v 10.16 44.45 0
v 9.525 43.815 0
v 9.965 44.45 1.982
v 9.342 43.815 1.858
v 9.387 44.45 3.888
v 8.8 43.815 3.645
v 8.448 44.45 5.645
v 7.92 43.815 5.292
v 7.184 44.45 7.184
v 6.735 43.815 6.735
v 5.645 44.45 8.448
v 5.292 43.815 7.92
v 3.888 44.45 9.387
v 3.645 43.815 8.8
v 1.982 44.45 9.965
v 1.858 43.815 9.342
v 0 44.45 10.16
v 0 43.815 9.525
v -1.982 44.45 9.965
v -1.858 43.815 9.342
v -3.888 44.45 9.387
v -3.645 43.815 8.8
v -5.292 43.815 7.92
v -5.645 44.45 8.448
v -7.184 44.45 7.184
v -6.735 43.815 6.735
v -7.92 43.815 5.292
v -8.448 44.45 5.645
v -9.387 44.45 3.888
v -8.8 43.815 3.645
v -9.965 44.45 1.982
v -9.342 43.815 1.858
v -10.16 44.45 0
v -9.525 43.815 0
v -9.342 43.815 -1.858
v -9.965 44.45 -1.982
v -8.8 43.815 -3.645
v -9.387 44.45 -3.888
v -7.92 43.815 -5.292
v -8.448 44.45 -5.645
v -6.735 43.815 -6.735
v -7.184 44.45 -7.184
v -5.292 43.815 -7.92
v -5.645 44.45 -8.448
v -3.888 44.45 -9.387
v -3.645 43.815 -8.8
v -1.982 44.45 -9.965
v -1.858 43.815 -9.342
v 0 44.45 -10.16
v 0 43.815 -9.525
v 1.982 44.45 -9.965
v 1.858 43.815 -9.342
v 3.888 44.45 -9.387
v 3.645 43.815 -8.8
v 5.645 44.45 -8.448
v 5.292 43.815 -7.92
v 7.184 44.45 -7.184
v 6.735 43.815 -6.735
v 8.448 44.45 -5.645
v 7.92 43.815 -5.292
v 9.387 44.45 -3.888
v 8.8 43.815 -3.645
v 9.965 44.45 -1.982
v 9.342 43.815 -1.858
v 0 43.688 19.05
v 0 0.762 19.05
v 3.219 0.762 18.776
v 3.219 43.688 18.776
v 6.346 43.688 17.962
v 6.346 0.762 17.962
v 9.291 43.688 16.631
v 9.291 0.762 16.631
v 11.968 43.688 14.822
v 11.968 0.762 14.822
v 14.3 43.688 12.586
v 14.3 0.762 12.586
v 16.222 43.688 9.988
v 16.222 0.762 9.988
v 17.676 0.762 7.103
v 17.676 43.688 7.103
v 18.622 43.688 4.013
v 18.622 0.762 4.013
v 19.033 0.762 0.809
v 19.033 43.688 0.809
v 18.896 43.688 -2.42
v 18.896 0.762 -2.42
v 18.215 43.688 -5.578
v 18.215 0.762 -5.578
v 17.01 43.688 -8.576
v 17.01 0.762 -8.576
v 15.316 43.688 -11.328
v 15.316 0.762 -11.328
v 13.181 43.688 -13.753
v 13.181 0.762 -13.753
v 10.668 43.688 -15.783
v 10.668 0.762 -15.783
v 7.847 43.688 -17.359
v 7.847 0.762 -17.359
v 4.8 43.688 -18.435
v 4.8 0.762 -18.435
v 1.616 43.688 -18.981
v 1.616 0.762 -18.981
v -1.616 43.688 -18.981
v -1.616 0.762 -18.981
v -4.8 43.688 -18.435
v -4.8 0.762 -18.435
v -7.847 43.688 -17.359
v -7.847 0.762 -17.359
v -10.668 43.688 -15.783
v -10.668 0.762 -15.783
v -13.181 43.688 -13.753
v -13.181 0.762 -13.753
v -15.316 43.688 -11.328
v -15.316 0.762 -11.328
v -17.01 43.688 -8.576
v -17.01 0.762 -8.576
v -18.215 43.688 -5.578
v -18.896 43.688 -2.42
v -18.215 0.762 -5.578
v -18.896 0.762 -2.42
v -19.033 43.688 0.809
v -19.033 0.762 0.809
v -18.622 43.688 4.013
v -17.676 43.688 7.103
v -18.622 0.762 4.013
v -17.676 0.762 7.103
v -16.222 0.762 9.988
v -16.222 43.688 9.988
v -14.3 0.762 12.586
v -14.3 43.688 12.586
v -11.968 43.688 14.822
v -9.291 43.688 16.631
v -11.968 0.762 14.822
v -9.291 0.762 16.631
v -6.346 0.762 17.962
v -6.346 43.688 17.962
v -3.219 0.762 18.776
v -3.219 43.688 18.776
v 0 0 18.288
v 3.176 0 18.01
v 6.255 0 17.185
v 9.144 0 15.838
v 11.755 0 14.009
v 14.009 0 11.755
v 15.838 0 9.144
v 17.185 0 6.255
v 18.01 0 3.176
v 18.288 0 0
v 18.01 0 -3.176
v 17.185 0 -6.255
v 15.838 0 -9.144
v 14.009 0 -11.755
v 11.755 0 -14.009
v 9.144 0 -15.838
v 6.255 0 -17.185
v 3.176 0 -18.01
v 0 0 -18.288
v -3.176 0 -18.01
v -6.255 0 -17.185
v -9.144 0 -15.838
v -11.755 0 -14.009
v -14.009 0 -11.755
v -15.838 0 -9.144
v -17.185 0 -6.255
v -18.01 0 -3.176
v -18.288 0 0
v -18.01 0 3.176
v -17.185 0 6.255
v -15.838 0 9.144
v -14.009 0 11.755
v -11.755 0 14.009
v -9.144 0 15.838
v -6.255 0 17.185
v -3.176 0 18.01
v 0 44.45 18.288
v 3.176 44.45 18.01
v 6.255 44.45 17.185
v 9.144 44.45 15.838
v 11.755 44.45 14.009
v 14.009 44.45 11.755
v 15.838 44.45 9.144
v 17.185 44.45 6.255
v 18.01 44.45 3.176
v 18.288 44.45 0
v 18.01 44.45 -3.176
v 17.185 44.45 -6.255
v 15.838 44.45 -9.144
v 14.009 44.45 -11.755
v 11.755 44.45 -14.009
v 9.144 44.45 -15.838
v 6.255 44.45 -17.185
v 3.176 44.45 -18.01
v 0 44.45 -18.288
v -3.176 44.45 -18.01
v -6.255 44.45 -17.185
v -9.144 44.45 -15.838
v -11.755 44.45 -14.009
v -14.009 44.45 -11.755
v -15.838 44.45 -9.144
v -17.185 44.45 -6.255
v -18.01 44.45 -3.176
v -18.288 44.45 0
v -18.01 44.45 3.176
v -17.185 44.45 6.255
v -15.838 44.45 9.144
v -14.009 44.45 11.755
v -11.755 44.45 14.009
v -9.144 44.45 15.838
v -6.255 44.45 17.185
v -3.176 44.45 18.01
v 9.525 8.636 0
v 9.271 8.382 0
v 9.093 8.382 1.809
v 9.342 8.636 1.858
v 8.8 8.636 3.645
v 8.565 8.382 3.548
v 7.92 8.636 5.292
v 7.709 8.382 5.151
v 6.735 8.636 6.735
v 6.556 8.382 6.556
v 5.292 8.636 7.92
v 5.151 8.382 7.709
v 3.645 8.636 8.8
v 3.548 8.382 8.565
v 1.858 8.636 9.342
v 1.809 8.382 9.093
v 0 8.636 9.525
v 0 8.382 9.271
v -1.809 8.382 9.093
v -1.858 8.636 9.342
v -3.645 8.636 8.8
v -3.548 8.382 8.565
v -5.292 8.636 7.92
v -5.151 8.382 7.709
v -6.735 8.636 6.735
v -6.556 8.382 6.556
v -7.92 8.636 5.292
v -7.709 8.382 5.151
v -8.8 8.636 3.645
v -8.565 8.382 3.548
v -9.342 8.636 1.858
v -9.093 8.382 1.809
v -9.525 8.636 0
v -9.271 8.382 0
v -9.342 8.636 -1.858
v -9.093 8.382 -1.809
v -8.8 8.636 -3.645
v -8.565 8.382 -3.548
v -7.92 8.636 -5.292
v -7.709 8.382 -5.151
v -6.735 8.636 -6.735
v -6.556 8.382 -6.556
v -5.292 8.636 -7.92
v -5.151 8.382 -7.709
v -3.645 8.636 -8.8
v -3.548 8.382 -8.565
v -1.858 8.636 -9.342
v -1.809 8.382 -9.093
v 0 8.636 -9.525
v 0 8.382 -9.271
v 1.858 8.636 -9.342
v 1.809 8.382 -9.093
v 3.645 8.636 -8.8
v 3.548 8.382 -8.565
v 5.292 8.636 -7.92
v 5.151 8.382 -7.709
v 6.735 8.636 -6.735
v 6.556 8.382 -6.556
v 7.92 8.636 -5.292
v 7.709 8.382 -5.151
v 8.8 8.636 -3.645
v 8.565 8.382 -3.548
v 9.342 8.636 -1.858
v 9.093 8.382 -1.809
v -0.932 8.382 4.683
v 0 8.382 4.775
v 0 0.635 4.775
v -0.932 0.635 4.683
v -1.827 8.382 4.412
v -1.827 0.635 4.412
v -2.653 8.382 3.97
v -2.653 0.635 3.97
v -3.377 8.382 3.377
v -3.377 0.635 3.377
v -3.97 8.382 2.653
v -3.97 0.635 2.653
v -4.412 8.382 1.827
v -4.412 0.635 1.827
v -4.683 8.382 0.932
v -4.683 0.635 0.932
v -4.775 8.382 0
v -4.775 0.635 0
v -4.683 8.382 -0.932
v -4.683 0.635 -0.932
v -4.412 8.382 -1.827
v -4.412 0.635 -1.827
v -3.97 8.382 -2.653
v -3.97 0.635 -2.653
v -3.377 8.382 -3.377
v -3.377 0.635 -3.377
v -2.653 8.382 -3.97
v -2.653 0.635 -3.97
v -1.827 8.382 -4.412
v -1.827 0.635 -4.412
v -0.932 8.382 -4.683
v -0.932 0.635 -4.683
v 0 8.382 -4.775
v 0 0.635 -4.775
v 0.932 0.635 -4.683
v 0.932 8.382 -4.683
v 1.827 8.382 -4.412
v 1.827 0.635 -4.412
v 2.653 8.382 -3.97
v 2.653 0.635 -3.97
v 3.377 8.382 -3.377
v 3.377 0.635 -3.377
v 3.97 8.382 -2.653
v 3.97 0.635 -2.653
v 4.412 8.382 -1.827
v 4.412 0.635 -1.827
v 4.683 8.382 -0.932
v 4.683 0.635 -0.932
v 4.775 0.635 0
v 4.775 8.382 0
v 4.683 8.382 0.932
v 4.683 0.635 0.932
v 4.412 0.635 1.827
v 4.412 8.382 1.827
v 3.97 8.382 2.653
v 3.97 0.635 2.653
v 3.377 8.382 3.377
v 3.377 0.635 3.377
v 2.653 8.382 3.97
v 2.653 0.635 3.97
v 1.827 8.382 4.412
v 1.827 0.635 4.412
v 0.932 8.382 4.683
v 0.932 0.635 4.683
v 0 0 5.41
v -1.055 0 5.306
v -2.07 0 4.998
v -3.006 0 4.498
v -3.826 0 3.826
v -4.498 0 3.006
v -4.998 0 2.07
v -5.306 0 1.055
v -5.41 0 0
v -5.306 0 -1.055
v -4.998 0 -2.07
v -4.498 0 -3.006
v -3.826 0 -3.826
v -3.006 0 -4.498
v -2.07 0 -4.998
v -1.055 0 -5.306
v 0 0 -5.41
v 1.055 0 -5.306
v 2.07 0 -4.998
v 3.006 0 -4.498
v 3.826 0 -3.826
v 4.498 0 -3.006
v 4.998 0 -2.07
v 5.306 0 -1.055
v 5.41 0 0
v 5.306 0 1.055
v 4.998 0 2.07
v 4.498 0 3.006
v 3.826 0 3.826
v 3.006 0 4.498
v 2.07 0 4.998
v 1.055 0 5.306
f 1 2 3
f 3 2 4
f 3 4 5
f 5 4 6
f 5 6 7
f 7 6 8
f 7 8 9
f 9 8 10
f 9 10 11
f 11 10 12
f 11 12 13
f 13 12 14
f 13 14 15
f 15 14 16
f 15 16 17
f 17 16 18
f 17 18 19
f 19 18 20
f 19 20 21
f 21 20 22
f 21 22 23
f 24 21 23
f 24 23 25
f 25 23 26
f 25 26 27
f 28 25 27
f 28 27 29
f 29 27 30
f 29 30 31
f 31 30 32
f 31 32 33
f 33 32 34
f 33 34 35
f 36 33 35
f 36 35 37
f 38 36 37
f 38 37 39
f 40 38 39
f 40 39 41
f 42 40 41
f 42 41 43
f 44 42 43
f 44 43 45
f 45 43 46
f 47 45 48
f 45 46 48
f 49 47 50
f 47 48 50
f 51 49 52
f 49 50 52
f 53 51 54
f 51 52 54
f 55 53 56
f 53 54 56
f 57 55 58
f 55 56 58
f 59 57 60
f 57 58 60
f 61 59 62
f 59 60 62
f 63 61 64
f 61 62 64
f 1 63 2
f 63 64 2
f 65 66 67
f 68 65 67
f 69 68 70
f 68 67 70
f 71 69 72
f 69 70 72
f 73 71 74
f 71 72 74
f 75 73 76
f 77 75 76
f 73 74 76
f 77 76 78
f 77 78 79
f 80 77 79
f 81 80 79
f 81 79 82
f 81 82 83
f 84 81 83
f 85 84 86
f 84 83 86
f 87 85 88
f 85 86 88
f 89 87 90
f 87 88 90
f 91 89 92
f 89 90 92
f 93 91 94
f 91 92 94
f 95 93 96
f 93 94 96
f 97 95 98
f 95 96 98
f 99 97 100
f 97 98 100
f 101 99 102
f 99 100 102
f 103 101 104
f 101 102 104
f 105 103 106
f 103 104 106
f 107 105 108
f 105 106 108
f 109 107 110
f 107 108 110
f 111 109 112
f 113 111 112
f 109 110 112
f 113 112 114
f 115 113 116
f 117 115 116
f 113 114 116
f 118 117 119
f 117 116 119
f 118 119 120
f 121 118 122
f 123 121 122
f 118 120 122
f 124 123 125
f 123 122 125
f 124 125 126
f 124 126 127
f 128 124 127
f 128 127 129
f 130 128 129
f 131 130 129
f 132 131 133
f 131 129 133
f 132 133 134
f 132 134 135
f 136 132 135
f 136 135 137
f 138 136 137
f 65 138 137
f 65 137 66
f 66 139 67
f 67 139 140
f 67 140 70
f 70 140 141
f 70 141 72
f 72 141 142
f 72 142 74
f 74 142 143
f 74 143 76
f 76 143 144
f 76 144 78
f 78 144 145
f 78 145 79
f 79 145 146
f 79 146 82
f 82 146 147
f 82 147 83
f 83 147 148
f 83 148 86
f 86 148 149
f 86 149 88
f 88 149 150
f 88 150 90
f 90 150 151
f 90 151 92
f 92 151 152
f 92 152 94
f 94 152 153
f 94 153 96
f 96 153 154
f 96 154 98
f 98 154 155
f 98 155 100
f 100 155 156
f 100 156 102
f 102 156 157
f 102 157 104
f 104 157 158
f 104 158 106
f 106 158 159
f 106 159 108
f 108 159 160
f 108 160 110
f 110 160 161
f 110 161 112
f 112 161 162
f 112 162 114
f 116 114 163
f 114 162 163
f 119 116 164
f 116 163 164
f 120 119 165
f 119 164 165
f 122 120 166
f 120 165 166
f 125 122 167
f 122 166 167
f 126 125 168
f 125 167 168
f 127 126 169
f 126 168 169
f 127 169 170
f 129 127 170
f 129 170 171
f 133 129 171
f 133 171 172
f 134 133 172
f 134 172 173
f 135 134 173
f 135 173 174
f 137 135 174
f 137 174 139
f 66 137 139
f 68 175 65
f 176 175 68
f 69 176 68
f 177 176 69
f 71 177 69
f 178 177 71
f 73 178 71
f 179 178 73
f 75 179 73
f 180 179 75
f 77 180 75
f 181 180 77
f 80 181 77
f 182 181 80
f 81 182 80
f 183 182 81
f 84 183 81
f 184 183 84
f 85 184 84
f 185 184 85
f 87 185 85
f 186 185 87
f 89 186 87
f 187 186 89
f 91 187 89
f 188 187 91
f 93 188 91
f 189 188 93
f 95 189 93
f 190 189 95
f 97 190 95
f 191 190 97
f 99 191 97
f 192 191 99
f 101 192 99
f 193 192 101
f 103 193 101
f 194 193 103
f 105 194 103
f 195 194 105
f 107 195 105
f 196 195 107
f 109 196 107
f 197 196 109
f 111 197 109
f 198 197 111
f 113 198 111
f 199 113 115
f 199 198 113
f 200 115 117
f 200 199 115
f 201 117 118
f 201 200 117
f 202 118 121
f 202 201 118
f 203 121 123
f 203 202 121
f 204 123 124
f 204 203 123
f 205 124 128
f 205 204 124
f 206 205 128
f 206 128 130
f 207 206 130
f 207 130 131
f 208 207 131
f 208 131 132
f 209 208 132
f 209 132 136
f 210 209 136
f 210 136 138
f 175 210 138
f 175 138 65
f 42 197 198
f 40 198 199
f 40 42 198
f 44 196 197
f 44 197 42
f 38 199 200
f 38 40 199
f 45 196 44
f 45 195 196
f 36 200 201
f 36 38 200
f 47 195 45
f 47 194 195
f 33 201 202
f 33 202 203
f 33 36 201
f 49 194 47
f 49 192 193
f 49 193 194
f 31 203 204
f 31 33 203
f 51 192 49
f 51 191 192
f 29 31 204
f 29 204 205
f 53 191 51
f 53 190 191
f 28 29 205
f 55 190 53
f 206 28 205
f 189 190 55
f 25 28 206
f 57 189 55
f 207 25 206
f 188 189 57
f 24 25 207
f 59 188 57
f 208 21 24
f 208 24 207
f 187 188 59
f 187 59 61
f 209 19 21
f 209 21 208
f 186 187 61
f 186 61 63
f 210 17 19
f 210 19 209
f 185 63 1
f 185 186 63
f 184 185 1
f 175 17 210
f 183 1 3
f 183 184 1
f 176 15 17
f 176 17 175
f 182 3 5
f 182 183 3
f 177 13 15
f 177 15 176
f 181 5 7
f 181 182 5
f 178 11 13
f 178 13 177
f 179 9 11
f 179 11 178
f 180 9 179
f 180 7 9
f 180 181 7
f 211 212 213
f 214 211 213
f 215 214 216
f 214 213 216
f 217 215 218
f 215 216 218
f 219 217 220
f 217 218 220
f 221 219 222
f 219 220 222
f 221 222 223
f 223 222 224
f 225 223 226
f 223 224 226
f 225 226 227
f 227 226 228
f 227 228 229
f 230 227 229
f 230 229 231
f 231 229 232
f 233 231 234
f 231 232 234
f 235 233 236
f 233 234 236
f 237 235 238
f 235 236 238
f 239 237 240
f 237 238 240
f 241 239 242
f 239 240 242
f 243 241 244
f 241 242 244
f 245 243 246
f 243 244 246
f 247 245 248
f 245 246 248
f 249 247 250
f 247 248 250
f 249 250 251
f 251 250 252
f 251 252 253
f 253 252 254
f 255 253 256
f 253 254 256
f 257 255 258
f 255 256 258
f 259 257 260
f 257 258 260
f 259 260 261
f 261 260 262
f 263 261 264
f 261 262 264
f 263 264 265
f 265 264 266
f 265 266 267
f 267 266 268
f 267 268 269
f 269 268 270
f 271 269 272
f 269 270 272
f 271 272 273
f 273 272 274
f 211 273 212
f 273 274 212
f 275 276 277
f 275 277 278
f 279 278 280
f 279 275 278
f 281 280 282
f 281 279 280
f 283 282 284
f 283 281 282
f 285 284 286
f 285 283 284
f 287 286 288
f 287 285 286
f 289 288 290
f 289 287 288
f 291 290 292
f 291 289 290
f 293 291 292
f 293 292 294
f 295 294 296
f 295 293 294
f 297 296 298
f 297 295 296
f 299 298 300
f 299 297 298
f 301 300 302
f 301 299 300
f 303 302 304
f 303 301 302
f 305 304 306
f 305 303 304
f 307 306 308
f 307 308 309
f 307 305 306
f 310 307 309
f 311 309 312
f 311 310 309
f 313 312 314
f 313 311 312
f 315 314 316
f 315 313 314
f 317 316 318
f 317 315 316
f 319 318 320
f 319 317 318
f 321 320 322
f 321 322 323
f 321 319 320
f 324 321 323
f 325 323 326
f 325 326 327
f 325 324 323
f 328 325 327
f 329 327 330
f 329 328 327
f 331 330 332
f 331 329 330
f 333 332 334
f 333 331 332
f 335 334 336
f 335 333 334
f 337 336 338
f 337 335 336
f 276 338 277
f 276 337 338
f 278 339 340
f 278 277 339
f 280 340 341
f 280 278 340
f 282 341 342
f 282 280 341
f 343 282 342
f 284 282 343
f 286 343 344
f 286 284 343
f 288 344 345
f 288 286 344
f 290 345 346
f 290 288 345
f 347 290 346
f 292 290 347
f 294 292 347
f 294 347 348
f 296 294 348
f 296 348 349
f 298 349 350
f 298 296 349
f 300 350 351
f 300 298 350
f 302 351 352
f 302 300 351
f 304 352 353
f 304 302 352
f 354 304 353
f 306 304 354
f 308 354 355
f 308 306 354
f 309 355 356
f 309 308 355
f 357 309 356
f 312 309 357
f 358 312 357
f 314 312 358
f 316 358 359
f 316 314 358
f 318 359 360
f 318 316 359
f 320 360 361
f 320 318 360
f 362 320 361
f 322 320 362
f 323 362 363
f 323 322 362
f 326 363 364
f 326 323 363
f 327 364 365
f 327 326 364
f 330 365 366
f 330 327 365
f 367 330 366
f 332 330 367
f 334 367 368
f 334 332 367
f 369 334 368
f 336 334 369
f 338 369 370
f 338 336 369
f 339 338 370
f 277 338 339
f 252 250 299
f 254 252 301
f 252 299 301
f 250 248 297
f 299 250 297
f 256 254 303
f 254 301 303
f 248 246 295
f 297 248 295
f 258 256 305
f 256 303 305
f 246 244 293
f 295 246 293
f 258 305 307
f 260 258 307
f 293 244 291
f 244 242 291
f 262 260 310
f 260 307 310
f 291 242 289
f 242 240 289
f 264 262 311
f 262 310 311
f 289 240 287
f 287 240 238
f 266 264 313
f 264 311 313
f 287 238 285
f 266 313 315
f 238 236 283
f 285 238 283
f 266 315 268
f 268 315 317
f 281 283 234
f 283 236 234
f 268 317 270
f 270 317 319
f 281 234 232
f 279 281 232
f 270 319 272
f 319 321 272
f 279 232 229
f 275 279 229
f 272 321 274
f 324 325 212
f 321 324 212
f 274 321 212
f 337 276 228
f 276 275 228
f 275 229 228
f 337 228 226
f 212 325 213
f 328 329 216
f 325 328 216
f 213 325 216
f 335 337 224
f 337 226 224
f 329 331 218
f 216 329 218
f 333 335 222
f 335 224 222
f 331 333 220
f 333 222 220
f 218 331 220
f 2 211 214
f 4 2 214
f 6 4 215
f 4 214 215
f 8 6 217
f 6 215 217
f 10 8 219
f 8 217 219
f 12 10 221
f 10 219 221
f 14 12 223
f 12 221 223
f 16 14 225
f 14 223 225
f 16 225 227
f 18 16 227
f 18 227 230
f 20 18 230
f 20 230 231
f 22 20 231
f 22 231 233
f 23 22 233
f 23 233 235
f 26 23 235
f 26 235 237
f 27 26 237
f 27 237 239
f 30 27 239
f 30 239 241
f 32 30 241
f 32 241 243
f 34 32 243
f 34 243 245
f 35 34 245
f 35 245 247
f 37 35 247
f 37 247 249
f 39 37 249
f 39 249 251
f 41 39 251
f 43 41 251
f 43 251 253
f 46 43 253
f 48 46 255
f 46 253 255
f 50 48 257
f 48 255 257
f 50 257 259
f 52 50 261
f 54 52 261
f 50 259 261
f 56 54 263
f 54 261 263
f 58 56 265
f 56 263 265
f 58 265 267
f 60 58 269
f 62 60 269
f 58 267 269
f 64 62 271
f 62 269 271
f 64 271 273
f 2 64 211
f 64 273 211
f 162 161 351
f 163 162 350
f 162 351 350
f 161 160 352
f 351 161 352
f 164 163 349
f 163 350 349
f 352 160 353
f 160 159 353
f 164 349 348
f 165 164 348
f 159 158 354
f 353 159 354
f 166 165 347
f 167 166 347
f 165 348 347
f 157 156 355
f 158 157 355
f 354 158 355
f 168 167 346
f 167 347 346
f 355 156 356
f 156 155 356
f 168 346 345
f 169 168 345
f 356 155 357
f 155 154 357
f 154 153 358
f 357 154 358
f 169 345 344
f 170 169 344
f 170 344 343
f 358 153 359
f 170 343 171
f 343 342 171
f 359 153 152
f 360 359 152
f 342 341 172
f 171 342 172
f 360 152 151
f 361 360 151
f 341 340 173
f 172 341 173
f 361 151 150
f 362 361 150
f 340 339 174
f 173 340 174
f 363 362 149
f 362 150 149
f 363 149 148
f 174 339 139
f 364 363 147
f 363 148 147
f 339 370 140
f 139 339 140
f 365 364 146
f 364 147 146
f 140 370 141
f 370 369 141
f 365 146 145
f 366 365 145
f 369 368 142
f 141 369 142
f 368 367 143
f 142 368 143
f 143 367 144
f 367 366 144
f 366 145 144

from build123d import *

# Parameters (mm, degrees)
SKETCH1_R                             = 19.05
EXTRUDE1_DEPTH                        = 44.45
CHAMFER1_SIZE                         = 0.762
F_3_4_0_75_DIAMETER_HOLE1_D           = 19.05
F_3_4_0_75_DIAMETER_HOLE1_DEPTH       = 36.068
F_3_4_0_75_DIAMETER_HOLE1_CSINK_D     = 20.32
F_3_4_0_75_DIAMETER_HOLE1_CSINK_ANGLE = 90
CHAMFER2_SIZE                         = 0.254


with BuildPart() as part:
    # Sketch1 → Extrude1 (new body)
    with BuildSketch(Plane(origin=(0, 0, 0), x_dir=(1, 0, 0), z_dir=(0, 1, 0))):
        with Locations(Location((0, 0, 0), (0, 0, 270))):  # turned: the seam where the file's is
            Circle(SKETCH1_R)
    extrude(amount=EXTRUDE1_DEPTH)

    # Sketch2 → 3/8 (0.375) Diameter Hole1 (revolve, cut)
    with BuildSketch(Plane(origin=(0, 44.45, 0), x_dir=(0, 0, 1), z_dir=(1, 0, 0))):
        Polygon((0, 0), (0, 44.45), (5.4102, 44.45), (4.7752, 43.815), (4.7752, 0), align=None)
    revolve(axis=Axis((0, 50.8, 0), (0, -1, 0)), mode=Mode.SUBTRACT)

    # Chamfer1
    chamfer1_edges = [part.edges().sort_by_distance(p)[0] for p in [
        (0, 0, -19.05),
        (0, 44.45, -19.05),
    ]]
    chamfer(chamfer1_edges, length=CHAMFER1_SIZE)

    # 3/4 (0.75) Diameter Hole1
    with Locations(Plane(origin=(0, 44.45, 0), x_dir=(-1, 0, 0), z_dir=(0, 1, 0))):
        with Locations((0, 0)):
            CounterSinkHole(F_3_4_0_75_DIAMETER_HOLE1_D / 2, F_3_4_0_75_DIAMETER_HOLE1_CSINK_D / 2, depth=F_3_4_0_75_DIAMETER_HOLE1_DEPTH, counter_sink_angle=F_3_4_0_75_DIAMETER_HOLE1_CSINK_ANGLE)

    # Chamfer2
    chamfer2_edges = [part.edges().sort_by_distance(p)[0] for p in [
        (-9.525, 8.382, 0),
    ]]
    chamfer(chamfer2_edges, length=CHAMFER2_SIZE)


solid = part.part
